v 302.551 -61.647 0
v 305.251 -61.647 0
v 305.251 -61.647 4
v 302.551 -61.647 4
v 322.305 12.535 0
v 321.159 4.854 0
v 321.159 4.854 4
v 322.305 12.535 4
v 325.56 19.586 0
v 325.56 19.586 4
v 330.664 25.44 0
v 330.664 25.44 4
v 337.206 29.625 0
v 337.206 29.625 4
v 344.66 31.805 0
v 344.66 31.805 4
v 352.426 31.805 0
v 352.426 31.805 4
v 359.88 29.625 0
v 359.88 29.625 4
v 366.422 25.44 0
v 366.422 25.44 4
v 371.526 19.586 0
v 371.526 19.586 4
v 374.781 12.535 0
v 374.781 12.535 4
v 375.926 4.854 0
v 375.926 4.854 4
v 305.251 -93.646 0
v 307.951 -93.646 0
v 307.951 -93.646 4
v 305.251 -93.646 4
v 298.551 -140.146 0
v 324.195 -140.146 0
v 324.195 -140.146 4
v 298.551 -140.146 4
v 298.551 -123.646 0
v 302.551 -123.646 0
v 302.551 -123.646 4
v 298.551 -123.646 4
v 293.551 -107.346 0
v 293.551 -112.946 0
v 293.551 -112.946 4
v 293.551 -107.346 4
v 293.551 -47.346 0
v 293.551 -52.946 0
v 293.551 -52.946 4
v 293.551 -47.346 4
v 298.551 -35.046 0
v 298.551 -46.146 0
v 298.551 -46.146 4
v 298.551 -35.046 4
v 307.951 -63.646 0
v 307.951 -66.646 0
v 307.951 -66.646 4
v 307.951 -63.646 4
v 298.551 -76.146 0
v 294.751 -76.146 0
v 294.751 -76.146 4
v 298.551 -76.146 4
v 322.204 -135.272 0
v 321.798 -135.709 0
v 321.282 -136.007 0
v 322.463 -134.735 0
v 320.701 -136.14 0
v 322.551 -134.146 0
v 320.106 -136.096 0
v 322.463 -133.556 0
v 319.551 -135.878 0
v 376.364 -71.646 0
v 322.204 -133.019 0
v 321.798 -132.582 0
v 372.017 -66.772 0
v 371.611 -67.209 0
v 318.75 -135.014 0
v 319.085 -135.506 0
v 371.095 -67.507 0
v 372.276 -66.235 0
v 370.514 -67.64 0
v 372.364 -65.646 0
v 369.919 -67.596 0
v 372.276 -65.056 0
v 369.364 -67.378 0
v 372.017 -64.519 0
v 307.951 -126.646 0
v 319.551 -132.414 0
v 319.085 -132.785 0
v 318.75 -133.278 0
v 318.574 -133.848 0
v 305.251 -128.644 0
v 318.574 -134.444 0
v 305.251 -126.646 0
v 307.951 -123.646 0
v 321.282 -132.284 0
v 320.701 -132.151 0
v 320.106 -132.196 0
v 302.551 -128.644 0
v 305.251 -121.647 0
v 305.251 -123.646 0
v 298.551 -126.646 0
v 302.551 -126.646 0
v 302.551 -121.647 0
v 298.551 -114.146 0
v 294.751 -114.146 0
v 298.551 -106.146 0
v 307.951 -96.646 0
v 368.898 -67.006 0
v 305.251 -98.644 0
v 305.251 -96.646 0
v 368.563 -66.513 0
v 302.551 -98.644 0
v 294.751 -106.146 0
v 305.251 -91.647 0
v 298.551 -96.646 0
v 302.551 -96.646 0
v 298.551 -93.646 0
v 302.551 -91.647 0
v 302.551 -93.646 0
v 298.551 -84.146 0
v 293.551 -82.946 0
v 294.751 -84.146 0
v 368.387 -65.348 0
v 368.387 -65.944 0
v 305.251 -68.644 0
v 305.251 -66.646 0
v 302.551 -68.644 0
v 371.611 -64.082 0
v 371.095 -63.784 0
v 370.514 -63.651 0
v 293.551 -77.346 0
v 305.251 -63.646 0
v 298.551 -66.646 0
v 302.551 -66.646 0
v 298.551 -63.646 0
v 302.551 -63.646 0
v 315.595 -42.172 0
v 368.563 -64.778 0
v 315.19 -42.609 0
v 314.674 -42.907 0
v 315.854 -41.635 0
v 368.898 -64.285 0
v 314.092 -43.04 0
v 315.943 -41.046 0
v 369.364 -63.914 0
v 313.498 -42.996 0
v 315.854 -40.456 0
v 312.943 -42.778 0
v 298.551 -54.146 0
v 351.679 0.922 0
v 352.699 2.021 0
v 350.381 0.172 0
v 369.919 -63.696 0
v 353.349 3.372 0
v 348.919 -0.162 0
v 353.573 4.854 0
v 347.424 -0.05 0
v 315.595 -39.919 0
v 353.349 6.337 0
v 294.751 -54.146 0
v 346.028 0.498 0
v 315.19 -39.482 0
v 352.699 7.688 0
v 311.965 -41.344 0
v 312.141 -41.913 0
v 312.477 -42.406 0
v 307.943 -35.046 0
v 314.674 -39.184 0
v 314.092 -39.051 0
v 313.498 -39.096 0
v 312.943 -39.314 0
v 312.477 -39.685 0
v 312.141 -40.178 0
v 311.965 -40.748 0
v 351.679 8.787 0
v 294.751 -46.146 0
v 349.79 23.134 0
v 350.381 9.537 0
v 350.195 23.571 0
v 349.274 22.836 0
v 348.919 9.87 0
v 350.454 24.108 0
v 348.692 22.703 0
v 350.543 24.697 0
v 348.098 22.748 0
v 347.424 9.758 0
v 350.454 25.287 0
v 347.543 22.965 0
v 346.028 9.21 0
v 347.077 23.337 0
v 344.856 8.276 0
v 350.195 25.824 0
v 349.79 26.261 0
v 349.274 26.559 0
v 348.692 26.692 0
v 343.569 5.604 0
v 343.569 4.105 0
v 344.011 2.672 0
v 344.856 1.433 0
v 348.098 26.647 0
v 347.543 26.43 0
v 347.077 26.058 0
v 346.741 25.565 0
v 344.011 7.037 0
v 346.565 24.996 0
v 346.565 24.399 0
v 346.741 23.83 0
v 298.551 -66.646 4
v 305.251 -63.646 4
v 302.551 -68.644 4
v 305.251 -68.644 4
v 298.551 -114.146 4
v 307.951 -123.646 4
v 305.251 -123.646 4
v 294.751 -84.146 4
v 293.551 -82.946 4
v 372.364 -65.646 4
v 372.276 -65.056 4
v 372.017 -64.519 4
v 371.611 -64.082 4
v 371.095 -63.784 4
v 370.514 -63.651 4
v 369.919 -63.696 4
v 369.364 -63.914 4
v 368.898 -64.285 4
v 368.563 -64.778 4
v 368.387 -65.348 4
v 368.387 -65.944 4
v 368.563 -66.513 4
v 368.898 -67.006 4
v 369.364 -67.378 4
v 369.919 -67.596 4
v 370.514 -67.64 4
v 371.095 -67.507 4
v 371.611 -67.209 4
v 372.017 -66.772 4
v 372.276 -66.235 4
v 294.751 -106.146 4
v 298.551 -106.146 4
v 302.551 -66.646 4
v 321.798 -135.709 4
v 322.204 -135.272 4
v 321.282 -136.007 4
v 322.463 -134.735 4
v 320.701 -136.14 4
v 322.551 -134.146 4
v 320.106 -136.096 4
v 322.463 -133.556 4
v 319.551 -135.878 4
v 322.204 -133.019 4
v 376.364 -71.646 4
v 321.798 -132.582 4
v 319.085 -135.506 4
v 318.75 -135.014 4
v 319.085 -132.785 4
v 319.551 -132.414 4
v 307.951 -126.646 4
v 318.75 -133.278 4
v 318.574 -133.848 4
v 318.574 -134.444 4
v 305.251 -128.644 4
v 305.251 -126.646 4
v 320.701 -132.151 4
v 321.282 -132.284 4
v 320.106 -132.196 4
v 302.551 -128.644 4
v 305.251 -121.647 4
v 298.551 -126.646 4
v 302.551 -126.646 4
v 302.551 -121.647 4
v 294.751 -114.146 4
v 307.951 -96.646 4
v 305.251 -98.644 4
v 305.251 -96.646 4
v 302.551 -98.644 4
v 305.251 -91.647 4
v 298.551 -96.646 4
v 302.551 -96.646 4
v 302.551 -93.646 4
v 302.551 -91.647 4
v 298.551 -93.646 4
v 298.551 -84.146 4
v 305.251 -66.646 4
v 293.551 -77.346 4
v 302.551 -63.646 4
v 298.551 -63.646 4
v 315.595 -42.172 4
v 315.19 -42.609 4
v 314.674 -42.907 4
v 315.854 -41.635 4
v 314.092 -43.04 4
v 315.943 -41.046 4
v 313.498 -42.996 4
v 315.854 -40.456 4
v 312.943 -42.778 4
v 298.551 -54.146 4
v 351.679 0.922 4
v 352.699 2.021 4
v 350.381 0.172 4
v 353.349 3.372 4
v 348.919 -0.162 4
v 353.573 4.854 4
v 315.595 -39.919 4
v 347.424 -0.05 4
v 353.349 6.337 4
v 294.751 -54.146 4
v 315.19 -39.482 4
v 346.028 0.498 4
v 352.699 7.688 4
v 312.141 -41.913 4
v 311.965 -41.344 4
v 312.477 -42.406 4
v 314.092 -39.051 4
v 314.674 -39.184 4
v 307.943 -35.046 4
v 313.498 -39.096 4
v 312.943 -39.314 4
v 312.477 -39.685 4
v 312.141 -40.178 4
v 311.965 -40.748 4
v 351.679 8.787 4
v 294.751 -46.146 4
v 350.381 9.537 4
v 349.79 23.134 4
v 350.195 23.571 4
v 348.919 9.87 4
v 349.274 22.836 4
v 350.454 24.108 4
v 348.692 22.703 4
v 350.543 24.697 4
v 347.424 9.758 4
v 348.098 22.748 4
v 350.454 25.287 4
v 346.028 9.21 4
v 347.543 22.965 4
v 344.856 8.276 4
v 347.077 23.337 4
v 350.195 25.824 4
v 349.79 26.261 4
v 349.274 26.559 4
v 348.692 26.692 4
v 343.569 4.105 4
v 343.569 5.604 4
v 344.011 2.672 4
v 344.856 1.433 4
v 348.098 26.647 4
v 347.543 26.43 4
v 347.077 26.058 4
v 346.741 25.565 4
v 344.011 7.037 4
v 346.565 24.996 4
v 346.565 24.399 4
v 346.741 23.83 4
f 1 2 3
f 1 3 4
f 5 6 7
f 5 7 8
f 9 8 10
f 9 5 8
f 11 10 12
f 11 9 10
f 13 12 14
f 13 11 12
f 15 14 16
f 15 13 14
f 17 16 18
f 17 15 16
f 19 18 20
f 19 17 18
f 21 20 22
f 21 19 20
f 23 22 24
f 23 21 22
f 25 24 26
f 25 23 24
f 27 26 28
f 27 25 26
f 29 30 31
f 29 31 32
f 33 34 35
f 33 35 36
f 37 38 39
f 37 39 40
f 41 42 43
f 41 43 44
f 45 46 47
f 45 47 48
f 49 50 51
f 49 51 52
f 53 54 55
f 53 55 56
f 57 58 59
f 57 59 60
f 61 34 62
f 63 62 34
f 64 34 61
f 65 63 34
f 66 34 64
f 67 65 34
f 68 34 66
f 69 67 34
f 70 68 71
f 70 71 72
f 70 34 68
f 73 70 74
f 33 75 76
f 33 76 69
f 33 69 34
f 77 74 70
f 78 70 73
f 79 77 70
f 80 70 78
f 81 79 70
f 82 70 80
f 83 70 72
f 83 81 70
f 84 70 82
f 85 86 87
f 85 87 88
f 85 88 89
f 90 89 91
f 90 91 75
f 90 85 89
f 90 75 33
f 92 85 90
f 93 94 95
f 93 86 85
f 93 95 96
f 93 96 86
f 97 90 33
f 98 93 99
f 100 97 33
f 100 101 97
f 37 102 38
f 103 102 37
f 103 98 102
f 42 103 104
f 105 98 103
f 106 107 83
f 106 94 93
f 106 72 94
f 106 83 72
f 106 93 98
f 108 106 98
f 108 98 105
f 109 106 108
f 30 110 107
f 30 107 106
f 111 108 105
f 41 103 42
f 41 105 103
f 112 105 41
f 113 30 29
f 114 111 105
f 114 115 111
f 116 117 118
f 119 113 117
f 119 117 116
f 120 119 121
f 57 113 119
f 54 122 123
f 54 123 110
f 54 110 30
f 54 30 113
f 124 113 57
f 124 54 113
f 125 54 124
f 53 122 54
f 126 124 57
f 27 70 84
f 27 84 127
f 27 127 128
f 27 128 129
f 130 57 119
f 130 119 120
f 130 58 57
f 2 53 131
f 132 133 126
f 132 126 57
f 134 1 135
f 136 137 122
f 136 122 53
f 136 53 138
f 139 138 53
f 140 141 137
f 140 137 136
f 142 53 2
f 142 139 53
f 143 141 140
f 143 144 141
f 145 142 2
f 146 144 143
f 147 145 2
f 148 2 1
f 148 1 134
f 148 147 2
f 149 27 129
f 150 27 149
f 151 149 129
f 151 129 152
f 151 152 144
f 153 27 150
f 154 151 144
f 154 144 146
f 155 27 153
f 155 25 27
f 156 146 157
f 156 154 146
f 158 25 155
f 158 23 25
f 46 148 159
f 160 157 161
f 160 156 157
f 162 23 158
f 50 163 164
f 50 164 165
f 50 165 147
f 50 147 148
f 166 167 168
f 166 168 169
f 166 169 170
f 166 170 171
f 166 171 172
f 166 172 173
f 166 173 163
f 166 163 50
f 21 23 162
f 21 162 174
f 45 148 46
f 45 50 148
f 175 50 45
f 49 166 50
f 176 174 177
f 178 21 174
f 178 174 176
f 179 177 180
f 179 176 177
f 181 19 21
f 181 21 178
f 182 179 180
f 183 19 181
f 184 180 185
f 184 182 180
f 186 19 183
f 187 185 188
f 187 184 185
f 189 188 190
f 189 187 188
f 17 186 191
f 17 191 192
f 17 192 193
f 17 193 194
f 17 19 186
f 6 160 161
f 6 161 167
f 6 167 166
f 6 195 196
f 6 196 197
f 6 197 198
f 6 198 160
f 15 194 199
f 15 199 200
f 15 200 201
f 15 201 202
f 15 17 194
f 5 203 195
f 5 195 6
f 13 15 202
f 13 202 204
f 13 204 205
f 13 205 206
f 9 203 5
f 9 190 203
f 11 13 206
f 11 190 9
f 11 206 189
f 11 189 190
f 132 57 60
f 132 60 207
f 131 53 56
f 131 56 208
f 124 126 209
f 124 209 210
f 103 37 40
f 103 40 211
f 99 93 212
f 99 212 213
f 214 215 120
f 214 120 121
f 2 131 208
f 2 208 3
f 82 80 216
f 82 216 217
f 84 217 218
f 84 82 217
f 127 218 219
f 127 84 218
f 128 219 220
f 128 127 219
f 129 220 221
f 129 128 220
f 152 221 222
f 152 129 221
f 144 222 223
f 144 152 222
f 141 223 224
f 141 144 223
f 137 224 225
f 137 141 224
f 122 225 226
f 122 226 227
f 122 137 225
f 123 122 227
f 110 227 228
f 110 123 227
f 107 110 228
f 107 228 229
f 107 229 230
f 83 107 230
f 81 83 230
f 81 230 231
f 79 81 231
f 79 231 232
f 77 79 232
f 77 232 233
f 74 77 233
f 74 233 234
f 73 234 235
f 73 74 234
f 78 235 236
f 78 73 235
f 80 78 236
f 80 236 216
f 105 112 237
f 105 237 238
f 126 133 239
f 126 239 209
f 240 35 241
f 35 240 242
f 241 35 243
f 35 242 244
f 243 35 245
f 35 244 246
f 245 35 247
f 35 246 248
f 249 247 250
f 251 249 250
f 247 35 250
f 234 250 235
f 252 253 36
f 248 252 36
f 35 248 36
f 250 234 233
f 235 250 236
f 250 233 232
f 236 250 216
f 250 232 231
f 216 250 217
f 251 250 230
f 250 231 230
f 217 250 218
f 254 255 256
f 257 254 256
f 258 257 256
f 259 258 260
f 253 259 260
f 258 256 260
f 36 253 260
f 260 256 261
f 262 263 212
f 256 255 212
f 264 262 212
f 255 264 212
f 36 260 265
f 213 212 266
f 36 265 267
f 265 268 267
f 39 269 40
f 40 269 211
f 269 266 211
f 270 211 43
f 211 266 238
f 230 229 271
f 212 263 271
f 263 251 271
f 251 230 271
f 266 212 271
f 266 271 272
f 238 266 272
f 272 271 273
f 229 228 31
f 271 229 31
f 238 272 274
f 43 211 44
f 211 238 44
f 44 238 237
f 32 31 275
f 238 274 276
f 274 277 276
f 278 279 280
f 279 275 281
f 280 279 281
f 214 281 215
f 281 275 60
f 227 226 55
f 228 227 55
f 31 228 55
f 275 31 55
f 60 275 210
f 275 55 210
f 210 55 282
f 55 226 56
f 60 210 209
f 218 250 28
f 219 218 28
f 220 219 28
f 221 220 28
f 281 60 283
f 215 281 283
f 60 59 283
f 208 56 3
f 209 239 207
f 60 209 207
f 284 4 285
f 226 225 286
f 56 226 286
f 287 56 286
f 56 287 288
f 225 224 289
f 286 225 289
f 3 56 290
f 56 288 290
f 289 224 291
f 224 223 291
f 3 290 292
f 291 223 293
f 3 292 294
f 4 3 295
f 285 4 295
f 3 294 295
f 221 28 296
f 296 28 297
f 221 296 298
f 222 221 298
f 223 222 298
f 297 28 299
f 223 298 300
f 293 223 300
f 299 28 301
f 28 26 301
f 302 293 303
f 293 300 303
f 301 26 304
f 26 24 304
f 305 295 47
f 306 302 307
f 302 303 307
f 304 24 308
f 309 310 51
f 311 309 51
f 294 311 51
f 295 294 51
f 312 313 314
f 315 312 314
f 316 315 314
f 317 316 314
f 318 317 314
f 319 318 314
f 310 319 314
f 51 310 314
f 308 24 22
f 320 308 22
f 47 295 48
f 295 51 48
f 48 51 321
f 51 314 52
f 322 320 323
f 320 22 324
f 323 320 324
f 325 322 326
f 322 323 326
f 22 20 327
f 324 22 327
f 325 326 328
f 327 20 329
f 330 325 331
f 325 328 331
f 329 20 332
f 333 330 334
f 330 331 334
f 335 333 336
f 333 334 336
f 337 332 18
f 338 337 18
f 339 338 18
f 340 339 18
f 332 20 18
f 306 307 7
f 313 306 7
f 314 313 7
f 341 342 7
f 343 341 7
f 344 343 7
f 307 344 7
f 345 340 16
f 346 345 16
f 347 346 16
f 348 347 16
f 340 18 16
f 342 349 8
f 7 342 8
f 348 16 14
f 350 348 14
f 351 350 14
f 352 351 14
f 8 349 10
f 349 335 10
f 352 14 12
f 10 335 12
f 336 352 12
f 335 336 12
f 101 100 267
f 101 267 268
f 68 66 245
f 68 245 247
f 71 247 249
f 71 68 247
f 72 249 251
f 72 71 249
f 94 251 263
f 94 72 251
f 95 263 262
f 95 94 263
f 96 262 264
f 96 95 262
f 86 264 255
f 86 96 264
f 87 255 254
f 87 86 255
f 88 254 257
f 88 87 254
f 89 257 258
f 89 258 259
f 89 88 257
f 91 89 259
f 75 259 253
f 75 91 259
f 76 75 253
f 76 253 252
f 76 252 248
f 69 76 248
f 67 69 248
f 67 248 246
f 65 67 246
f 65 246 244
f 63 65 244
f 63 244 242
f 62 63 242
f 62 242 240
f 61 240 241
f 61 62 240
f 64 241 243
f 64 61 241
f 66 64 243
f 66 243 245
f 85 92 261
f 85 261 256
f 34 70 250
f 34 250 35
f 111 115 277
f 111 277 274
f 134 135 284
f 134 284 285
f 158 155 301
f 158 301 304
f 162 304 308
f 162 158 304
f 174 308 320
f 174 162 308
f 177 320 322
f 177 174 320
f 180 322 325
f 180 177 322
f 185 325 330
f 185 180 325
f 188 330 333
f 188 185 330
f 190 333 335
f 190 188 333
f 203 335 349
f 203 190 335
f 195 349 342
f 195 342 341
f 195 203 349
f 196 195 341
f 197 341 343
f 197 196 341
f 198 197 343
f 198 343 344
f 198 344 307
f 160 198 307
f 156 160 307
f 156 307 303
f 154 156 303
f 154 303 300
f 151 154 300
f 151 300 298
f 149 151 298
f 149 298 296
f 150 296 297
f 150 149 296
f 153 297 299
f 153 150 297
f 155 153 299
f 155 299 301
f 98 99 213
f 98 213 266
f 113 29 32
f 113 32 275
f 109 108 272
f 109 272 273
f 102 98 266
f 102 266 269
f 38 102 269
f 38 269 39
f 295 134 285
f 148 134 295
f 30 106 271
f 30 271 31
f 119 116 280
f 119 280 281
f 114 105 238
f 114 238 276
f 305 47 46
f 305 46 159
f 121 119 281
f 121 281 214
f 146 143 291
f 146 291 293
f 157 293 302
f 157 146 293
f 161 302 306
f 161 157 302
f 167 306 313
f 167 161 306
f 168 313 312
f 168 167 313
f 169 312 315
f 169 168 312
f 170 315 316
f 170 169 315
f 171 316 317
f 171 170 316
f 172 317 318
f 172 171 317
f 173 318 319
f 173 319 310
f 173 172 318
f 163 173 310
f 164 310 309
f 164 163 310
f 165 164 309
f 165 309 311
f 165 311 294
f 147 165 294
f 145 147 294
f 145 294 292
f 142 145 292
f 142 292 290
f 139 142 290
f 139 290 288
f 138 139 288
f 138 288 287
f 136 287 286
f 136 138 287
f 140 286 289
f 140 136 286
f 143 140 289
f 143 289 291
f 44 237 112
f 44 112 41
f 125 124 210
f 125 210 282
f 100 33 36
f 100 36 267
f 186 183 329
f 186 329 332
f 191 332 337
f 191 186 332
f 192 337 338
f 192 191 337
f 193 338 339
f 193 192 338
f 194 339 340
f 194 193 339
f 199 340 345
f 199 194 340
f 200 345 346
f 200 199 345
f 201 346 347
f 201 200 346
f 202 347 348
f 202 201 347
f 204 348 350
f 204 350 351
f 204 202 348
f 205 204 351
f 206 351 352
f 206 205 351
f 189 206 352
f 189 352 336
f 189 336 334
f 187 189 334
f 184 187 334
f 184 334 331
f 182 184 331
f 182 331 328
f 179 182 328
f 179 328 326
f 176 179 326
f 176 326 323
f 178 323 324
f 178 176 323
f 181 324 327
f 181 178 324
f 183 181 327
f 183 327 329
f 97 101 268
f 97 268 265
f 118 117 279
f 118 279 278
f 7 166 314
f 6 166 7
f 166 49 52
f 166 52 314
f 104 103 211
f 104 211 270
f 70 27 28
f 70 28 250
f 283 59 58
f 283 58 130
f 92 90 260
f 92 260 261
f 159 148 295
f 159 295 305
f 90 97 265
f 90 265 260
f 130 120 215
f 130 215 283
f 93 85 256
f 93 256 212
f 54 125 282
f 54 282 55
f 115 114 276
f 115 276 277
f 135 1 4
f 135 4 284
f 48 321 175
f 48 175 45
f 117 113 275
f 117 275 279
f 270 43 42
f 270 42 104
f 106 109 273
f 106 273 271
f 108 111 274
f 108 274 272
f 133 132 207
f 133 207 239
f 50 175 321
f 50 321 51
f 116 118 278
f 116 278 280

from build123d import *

# Parameters (mm, degrees)
SKETCH_1_R          = 5.03
SKETCH_1_R_2        = 2
EXTRUDE_1_DEPTH     = 4
CUT_EXTRUDE_1_DEPTH = 4


with BuildPart() as part:
    # 草图1 → 凸台-拉伸1 (new body)
    with BuildSketch(Plane.XY):
        with BuildLine():
            Line((298.551498293, -96.645689396), (302.551498293, -96.645689396))
            Line((302.551498293, -96.645689396), (302.551498293, -98.644151028))
            Line((302.551498293, -98.644151028), (305.251498293, -98.644151028))
            Line((305.251498293, -98.644151028), (305.251498293, -96.645689396))
            Line((305.251498293, -96.645689396), (307.951498293, -96.645689396))
            Line((307.951498293, -96.645689396), (307.951498293, -93.645689396))
            Line((307.951498293, -93.645689396), (305.251498293, -93.645689396))
            Line((305.251498293, -93.645689396), (305.251498293, -91.647227763))
            Line((305.251498293, -91.647227763), (302.551498293, -91.647227763))
            Line((302.551498293, -91.647227763), (302.551498293, -93.645689396))
            Line((302.551498293, -93.645689396), (298.551498293, -93.645689396))
            Line((298.551498293, -93.645689396), (298.551498293, -84.145716775))
            Line((298.551498293, -84.145716775), (293.551498293, -84.145716775))
            Line((293.551498293, -84.145716775), (293.551498293, -76.145716775))
            Line((293.551498293, -76.145716775), (298.551498293, -76.145716775))
            Line((298.551498293, -76.145716775), (298.551498293, -66.645694374))
            Line((298.551498293, -66.645694374), (302.551498293, -66.645694374))
            Line((302.551498293, -66.645694374), (302.551498293, -68.644156006))
            Line((302.551498293, -68.644156006), (305.251498293, -68.644156006))
            Line((305.251498293, -68.644156006), (305.251498293, -66.645694374))
            Line((305.251498293, -66.645694374), (307.951498293, -66.645694374))
            Line((307.951498293, -66.645694374), (307.951498293, -63.645694374))
            Line((307.951498293, -63.645694374), (305.251498293, -63.645694374))
            Line((305.251498293, -63.645694374), (305.251498293, -61.647232741))
            Line((305.251498293, -61.647232741), (302.551498293, -61.647232741))
            Line((302.551498293, -61.647232741), (302.551498293, -63.645694374))
            Line((302.551498293, -63.645694374), (298.551498293, -63.645694374))
            Line((298.551498293, -63.645694374), (298.551498293, -54.145671973))
            Line((298.551498293, -54.145671973), (293.551498293, -54.145671973))
            Line((293.551498293, -54.145671973), (293.551498293, -46.145671973))
            Line((293.551498293, -46.145671973), (298.551498293, -46.145671973))
            Line((298.551498293, -46.145671973), (298.551498293, -35.045714286))
            Line((298.551498293, -35.045714286), (307.942857143, -35.045714286))
            Line((307.942857143, -35.045714286), (321.159325739, 4.854285714))
            ThreePointArc((321.159325739, 4.854285714), (348.542857143, 32.081451417), (375.926388547, 4.854285714))
            Line((375.926388547, 4.854285714), (376.364473934, -71.645714286))
            Line((376.364473934, -71.645714286), (324.194731876, -140.145734198))
            Line((324.194731876, -140.145734198), (298.551498293, -140.145734198))
            Line((298.551498293, -140.145734198), (298.551498293, -126.645734198))
            Line((298.551498293, -126.645734198), (302.551498293, -126.645734198))
            Line((302.551498293, -126.645734198), (302.551498293, -128.644195831))
            Line((302.551498293, -128.644195831), (305.251498293, -128.644195831))
            Line((305.251498293, -128.644195831), (305.251498293, -126.645734198))
            Line((305.251498293, -126.645734198), (307.951498293, -126.645734198))
            Line((307.951498293, -126.645734198), (307.951498293, -123.645734198))
            Line((307.951498293, -123.645734198), (305.251498293, -123.645734198))
            Line((305.251498293, -123.645734198), (305.251498293, -121.647272565))
            Line((305.251498293, -121.647272565), (302.551498293, -121.647272565))
            Line((302.551498293, -121.647272565), (302.551498293, -123.645734198))
            Line((302.551498293, -123.645734198), (298.551498293, -123.645734198))
            Line((298.551498293, -123.645734198), (298.551498293, -114.145711797))
            Line((298.551498293, -114.145711797), (293.551498293, -114.145711797))
            Line((293.551498293, -114.145711797), (293.551498293, -106.145711797))
            Line((293.551498293, -106.145711797), (298.551498293, -106.145711797))
            Line((298.551498293, -106.145711797), (298.551498293, -96.645689396))
        make_face()
        with Locations((348.542857143, 4.854285714)):
            Circle(SKETCH_1_R, mode=Mode.SUBTRACT)
        with Locations((348.542857143, 24.697471009)):
            Circle(SKETCH_1_R_2, mode=Mode.SUBTRACT)
        with Locations((320.551498293, -134.145734198)):
            Circle(SKETCH_1_R_2, mode=Mode.SUBTRACT)
        with Locations((370.364473934, -65.645714286)):
            Circle(SKETCH_1_R_2, mode=Mode.SUBTRACT)
        with Locations((313.942857143, -41.045714286)):
            Circle(SKETCH_1_R_2, mode=Mode.SUBTRACT)
    extrude(amount=EXTRUDE_1_DEPTH)

    # 草图3 → 切除-拉伸1 (cut)
    with BuildSketch(Plane.XY.offset(4)):
        Polygon((293.551498293, -46.145671973), (294.751498293, -46.145671973), (293.551498293, -47.345671973), align=None)
        Polygon((294.751498293, -84.145716775), (293.551498293, -84.145716775), (293.551498293, -82.945716775), align=None)
        Polygon((293.551498293, -77.345716775), (293.551498293, -76.145716775), (294.751498293, -76.145716775), align=None)
        Polygon((294.751498293, -54.145671973), (293.551498293, -54.145671973), (293.551498293, -52.945671973), align=None)
        Polygon((293.551498293, -114.145711797), (293.551498293, -112.945711797), (294.751498293, -114.145711797), align=None)
        Polygon((293.551498293, -107.345711797), (293.551498293, -106.145711797), (294.751498293, -106.145711797), align=None)
    extrude(amount=-CUT_EXTRUDE_1_DEPTH, mode=Mode.SUBTRACT)


solid = part.part
